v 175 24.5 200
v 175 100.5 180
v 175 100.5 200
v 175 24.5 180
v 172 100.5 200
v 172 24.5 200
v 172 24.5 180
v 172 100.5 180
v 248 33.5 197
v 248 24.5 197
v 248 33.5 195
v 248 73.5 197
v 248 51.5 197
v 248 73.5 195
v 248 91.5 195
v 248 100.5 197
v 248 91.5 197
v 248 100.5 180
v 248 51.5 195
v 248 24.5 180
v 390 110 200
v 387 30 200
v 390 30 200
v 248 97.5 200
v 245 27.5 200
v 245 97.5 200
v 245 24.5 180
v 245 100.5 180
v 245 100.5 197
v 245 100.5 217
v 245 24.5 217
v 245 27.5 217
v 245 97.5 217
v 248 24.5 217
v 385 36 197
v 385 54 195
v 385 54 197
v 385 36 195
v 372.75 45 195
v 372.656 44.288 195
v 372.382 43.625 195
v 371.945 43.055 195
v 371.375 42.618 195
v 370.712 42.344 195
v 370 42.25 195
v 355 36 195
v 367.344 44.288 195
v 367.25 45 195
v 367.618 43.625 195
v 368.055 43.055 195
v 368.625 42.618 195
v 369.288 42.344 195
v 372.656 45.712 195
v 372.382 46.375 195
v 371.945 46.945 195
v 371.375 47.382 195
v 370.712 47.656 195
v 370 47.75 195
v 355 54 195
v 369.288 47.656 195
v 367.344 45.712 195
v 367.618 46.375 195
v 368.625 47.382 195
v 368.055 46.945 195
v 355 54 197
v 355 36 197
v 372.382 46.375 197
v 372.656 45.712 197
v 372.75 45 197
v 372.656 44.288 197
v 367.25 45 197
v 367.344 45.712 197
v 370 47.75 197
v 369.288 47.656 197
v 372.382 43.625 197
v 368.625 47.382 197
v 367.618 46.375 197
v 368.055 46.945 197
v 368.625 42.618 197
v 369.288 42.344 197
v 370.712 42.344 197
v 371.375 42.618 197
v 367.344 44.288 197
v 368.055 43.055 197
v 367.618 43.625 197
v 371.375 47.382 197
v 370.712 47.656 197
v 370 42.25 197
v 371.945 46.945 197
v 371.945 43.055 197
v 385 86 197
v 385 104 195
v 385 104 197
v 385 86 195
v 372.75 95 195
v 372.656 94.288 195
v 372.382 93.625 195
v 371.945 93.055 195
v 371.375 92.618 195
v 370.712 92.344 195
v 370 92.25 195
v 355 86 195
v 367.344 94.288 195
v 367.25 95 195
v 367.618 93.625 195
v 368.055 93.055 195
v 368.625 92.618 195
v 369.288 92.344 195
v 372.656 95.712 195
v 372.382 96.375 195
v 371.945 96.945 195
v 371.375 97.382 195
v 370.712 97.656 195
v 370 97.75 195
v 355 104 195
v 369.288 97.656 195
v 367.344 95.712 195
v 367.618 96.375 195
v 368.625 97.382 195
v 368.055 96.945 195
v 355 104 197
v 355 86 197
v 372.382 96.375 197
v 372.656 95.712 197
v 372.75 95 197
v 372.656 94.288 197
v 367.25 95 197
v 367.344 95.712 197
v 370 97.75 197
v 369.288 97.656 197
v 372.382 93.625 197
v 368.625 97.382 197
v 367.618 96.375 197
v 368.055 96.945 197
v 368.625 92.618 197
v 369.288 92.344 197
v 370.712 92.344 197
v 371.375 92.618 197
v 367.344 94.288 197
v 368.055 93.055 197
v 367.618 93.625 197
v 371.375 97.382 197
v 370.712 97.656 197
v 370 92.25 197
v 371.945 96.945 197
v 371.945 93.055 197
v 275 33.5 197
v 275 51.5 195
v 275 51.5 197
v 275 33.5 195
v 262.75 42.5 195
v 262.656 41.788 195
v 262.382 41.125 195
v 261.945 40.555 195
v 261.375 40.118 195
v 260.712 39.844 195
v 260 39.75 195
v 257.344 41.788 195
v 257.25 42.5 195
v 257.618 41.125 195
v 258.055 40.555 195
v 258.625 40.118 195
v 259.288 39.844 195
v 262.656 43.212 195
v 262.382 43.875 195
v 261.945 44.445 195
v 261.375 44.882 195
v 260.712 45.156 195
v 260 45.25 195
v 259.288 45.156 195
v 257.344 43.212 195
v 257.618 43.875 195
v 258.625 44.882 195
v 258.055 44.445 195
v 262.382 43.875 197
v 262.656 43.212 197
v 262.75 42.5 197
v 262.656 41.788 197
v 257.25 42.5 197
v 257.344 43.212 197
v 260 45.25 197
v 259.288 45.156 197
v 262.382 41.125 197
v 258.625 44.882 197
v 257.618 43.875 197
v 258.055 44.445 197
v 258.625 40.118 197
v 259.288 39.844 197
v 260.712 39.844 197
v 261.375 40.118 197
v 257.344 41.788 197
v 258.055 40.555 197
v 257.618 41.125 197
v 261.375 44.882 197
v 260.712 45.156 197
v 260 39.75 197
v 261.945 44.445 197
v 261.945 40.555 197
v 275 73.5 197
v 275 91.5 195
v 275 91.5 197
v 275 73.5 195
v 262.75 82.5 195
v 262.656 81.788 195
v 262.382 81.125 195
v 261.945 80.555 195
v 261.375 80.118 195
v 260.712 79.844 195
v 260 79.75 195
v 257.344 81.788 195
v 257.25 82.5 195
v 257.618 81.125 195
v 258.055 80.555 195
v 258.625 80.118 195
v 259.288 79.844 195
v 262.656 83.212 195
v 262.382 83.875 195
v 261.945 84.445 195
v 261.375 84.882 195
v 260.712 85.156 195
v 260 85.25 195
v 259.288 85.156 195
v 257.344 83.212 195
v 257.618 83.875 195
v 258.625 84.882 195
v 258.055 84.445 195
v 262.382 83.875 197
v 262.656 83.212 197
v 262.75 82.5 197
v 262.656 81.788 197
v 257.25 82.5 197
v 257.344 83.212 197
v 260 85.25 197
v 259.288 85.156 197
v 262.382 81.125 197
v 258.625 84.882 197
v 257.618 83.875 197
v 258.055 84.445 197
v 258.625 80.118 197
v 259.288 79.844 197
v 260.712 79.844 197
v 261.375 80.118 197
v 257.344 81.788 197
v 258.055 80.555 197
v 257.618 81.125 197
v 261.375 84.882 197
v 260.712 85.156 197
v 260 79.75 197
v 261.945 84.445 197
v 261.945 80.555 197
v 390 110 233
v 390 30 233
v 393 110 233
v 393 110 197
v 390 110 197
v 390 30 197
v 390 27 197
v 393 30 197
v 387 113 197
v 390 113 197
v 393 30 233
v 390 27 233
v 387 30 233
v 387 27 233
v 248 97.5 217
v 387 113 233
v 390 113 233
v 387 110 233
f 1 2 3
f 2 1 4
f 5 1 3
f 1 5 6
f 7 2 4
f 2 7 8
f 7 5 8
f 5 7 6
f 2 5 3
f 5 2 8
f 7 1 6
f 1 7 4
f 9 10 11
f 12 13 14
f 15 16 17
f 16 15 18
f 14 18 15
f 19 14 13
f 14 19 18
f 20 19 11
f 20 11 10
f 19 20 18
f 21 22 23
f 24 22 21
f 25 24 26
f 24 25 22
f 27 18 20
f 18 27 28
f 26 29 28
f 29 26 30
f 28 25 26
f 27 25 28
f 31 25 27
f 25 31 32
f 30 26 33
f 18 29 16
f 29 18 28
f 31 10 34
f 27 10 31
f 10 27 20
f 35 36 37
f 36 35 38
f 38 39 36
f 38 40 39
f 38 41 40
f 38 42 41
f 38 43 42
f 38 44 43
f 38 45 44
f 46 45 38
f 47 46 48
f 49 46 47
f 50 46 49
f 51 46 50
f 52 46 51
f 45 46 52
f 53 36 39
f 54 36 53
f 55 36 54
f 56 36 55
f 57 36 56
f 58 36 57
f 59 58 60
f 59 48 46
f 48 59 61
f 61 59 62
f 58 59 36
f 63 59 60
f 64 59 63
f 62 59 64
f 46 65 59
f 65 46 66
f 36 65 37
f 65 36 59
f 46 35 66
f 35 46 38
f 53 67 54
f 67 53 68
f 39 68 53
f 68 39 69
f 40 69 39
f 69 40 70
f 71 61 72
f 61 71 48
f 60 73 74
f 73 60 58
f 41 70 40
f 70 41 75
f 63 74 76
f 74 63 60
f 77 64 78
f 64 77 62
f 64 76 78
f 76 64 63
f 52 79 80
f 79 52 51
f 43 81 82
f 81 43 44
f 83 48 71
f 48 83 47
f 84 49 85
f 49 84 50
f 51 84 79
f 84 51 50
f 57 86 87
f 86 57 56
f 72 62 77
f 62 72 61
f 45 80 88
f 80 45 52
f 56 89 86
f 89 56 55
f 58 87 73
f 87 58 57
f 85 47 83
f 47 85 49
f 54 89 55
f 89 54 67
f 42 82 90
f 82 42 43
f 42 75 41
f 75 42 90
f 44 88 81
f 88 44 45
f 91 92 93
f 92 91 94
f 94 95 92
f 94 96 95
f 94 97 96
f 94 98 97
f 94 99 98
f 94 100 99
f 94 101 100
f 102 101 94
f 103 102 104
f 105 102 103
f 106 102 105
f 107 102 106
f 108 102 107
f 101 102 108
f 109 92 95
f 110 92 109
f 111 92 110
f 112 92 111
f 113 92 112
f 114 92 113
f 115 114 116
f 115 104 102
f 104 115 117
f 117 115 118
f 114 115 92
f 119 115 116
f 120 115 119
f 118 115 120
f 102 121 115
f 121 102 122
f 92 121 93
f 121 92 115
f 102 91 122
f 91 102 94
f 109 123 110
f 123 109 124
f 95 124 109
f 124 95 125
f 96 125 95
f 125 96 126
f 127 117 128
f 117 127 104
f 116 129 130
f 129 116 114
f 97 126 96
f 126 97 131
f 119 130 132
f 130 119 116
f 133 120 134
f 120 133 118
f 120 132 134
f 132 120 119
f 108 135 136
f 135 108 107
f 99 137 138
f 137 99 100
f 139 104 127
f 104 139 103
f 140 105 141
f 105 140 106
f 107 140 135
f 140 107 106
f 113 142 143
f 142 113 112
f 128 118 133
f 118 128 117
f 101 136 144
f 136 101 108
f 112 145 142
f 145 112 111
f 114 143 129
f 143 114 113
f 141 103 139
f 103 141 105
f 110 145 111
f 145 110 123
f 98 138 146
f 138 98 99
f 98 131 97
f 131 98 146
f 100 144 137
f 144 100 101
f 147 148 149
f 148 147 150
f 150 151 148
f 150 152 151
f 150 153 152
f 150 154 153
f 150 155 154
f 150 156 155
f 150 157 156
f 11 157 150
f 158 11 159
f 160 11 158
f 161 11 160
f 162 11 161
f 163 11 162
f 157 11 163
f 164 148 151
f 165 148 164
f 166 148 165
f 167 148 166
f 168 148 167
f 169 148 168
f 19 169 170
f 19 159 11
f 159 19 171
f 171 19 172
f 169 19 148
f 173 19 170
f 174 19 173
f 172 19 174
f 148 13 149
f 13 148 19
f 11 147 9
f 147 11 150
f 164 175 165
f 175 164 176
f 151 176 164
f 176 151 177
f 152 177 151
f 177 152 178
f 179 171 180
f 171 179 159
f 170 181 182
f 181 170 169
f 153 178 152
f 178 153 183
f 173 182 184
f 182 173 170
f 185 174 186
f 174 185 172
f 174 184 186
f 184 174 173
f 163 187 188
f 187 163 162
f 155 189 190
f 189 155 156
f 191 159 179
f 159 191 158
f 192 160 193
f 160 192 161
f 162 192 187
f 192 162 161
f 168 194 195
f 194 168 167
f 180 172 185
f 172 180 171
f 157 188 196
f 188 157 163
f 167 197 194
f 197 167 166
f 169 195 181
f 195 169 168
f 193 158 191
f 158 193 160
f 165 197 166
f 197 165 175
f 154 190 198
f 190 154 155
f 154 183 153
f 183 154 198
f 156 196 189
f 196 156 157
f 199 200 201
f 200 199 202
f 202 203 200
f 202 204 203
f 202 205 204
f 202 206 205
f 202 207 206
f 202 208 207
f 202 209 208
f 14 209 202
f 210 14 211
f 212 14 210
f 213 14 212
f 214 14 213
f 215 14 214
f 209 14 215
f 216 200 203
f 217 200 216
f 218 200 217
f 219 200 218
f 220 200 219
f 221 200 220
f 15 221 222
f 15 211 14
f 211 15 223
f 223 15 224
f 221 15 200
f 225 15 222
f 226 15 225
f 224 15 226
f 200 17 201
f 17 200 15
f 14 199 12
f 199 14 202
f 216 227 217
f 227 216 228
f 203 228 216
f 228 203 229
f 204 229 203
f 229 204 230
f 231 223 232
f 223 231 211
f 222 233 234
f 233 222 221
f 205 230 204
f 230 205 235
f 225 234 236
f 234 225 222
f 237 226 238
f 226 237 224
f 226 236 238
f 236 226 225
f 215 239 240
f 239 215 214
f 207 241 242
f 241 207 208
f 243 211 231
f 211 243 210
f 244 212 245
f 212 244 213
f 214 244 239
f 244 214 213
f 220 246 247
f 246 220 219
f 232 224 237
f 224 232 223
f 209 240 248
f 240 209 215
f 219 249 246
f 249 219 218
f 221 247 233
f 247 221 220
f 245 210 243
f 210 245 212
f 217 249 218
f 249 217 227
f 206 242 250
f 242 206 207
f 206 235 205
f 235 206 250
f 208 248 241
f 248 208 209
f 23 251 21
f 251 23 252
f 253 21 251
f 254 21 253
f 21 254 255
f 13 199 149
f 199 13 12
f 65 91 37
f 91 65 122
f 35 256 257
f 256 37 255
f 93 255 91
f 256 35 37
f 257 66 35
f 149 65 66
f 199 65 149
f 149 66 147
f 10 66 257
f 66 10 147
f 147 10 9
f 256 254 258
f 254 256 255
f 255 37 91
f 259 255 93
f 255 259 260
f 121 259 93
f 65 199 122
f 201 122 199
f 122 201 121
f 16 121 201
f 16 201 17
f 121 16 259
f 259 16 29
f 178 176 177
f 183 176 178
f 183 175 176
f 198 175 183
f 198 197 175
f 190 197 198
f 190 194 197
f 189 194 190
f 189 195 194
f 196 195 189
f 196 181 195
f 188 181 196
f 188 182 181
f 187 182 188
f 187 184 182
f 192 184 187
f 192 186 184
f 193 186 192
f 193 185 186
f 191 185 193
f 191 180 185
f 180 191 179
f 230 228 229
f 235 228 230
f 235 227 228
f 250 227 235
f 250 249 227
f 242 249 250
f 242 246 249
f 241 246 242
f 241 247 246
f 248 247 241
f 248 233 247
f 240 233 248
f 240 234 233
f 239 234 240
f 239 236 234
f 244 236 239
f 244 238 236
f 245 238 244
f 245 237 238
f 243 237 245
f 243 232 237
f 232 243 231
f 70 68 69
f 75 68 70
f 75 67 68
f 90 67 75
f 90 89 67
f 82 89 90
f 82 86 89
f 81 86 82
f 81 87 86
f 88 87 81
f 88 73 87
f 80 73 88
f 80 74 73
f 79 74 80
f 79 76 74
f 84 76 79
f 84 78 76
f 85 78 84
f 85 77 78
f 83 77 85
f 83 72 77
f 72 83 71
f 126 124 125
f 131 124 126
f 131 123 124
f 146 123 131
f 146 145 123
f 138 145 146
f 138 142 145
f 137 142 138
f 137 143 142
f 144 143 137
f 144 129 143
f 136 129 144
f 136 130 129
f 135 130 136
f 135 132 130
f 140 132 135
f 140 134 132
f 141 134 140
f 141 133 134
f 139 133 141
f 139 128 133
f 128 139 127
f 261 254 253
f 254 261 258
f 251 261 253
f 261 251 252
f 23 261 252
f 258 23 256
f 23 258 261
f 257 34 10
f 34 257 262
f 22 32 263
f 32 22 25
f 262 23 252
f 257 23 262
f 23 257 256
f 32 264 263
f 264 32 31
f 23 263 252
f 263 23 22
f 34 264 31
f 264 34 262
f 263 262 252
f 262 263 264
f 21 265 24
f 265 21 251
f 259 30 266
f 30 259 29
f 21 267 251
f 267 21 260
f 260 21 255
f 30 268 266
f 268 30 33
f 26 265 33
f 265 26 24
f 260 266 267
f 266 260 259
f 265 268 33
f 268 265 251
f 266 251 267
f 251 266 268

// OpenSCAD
// ============================================================
// LEGO AI Sorting Machine — Entry Chute & Funnel
// ============================================================
//
// PURPOSE:
//   Bridges the gap between the conveyor belt exit and the
//   top of the binary gate tree.
//
//   Belt exit:  x=390, z=218, y-centre=70 (80mm wide belt)
//   Gate root:  x=175–245 (70mm wide), top at z=200, y=35–90
//
// HOW IT WORKS:
//   1. RIGHT CATCH WALL — vertical plate at x=390 stops bricks
//      from flying past the entry. Belt ends at the roller
//      (radius 12.5mm) so bricks fall ~18mm onto the ramp.
//   2. RAMP FLOOR — slopes 4.8° downward from the catch wall
//      (x=390, z=215) to the gate root opening (x=245, z=200).
//      Gravity carries bricks along this slope.
//   3. TAPERED SIDE WALLS — funnel the width from the full belt
//      width (80mm) at the inlet down to the gate module width
//      (70mm) at the outlet.
//   4. GATE THROAT — short vertical section at x=245 that aligns
//      the brick with the root gate flap centreline.
//
// PRINT OPTIMISATION:
//   Split into FRONT HALF and BACK HALF — each half is an open
//   trough that prints face-up with zero supports.
//   The two halves clip together with the same snap-tab system
//   as the gate modules.
//
//   Material: PETG (low friction, durable)
//   Layer height: 0.2mm
//   Infill: 20%
//   Supports: NONE
//   Estimated print time: ~45 min per half
//
// MOUNTING:
//   Four M5 tabs bolt to the 2020 extrusion frame rails at the
//   belt level. The chute aligns with the belt end roller on
//   the right and drops into the gate root channel on the left.
//
// All dimensions in mm.
// ============================================================

$fn = 48;

// ── KEY GEOMETRY ───────────────────────────────────────────

// Belt exit (right end of belt)
BELT_EXIT_X  = 390;
BELT_SURF_Z  = 218;   // belt top surface height
BELT_Y_MIN   = 30;
BELT_Y_MAX   = 110;
BELT_Y_CEN   = 70;    // (30+110)/2
BELT_WIDTH   = 80;    // y span of belt

// Gate root input
GATE_X_LEFT  = 175;   // root gate left wall
GATE_X_RIGHT = 245;   // root gate right wall
GATE_Y_MIN   = 35;
GATE_Y_MAX   = 90;
GATE_Y_CEN   = 62.5;  // (35+90)/2
GATE_WIDTH   = 70;    // y span of gate root
GATE_TOP_Z   = 200;   // top of root gate module

// Derived
RAMP_DROP    = BELT_SURF_Z - 4 - GATE_TOP_Z;   // ~14mm — ramp height change
RAMP_RUN     = BELT_EXIT_X - GATE_X_RIGHT;     // ~145mm — horizontal run
RAMP_ANGLE   = atan(RAMP_DROP / RAMP_RUN);     // ≈5.5° — gentle slope
CATCH_HEIGHT = BELT_SURF_Z + 15 - GATE_TOP_Z;  // catch wall height above ramp base

// Wall thickness
WALL = 3;
SNAP_W = 8;
SNAP_H = 4;
SNAP_D = 2;
SNAP_TOL = 0.25;
M5_DIA = 5.5;

// ── RAMP FLOOR ─────────────────────────────────────────────
// Solid sloped panel — formed by hull of inlet and outlet edges.
// Inlet edge: at x=BELT_EXIT_X, full belt width
// Outlet edge: at x=GATE_X_RIGHT, gate root width

module ramp_floor() {
    hull() {
        // Inlet (right, high) — full belt width
        translate([BELT_EXIT_X - WALL,
                   BELT_Y_CEN - BELT_WIDTH/2,
                   GATE_TOP_Z - WALL])
            cube([WALL, BELT_WIDTH, WALL]);

        // Outlet (left, low) — gate root width
        translate([GATE_X_RIGHT,
                   GATE_Y_CEN - GATE_WIDTH/2,
                   GATE_TOP_Z - WALL])
            cube([WALL, GATE_WIDTH, WALL]);
    }
}

// ── RIGHT CATCH WALL ───────────────────────────────────────
// Vertical plate that stops bricks from shooting off the end.
// Spans full belt width in y; extends from ramp top to above belt.

module catch_wall() {
    translate([BELT_EXIT_X,
               BELT_Y_CEN - BELT_WIDTH/2,
               GATE_TOP_Z - WALL])
        cube([WALL, BELT_WIDTH, CATCH_HEIGHT + WALL]);
}

// ── FRONT SIDE WALL ────────────────────────────────────────
// Tapers from belt width at inlet to gate width at outlet.
// Prints flat on its face — no overhangs.

module front_wall() {
    hull() {
        // Inlet corner
        translate([BELT_EXIT_X - WALL,
                   BELT_Y_CEN - BELT_WIDTH/2 - WALL,
                   GATE_TOP_Z - WALL])
            cube([WALL, WALL, CATCH_HEIGHT + WALL]);
        // Outlet corner
        translate([GATE_X_RIGHT,
                   GATE_Y_CEN - GATE_WIDTH/2 - WALL,
                   GATE_TOP_Z - WALL])
            cube([WALL, WALL, RAMP_DROP + 2*WALL]);
    }
}

// ── BACK SIDE WALL ─────────────────────────────────────────
module back_wall() {
    hull() {
        translate([BELT_EXIT_X - WALL,
                   BELT_Y_CEN + BELT_WIDTH/2,
                   GATE_TOP_Z - WALL])
            cube([WALL, WALL, CATCH_HEIGHT + WALL]);
        translate([GATE_X_RIGHT,
                   GATE_Y_CEN + GATE_WIDTH/2,
                   GATE_TOP_Z - WALL])
            cube([WALL, WALL, RAMP_DROP + 2*WALL]);
    }
}

// ── GATE THROAT ────────────────────────────────────────────
// Short vertical section at the outlet that aligns the brick
// with the root gate opening and prevents it from bouncing out.

module gate_throat() {
    throat_h = 20;
    // Left wall of throat
    translate([GATE_X_LEFT - WALL,
               GATE_Y_CEN - GATE_WIDTH/2 - WALL,
               GATE_TOP_Z - throat_h])
        cube([WALL, GATE_WIDTH + 2*WALL, throat_h]);
    // Right wall of throat
    translate([GATE_X_RIGHT,
               GATE_Y_CEN - GATE_WIDTH/2 - WALL,
               GATE_TOP_Z - throat_h])
        cube([WALL, GATE_WIDTH + 2*WALL, throat_h]);
}

// ── MOUNTING TABS ──────────────────────────────────────────
// Four M5 tabs that bolt to the 2020 extrusion frame rails.

module mount_tab(x, y) {
    tab_l = 30; tab_w = 18; tab_t = 5;
    translate([x - tab_l/2, y - tab_w/2, GATE_TOP_Z - tab_t])
        difference() {
            cube([tab_l, tab_w, tab_t]);
            translate([tab_l/2, tab_w/2, -1])
                cylinder(h=tab_t+2, d=M5_DIA, $fn=24);
        }
}

module mounting_tabs() {
    // Two tabs near belt end
    mount_tab(BELT_EXIT_X - 20, BELT_Y_CEN - 25);
    mount_tab(BELT_EXIT_X - 20, BELT_Y_CEN + 25);
    // Two tabs at gate end
    mount_tab(GATE_X_RIGHT + 15, GATE_Y_CEN - 20);
    mount_tab(GATE_X_RIGHT + 15, GATE_Y_CEN + 20);
}

// ── SNAP TABS (for split halves) ───────────────────────────
// Same pattern as gate modules so all snap tools are compatible.

HALF_Y = (BELT_Y_CEN + GATE_Y_CEN) / 2;   // split plane y

module snap_tabs_male() {
    for (x = [BELT_EXIT_X - 30, GATE_X_RIGHT + 15])
        translate([x - SNAP_W/2, HALF_Y, GATE_TOP_Z + 5])
            cube([SNAP_W, SNAP_D, SNAP_H]);
}

module snap_slots_female() {
    for (x = [BELT_EXIT_X - 30, GATE_X_RIGHT + 15])
        translate([x - SNAP_W/2 - SNAP_TOL,
                   HALF_Y - SNAP_D - SNAP_TOL,
                   GATE_TOP_Z + 5 - SNAP_TOL])
            cube([SNAP_W + 2*SNAP_TOL,
                  SNAP_D + 2*SNAP_TOL,
                  SNAP_H + 2*SNAP_TOL]);
}

// ── COMPLETE CHUTE (assembled) ─────────────────────────────

module entry_chute_assembled() {
    ramp_floor();
    catch_wall();
    front_wall();
    back_wall();
    gate_throat();
    mounting_tabs();
}

// ── FRONT HALF (prints face-up, open side up) ──────────────
// Keeps the front half of the chute (y <= HALF_Y)

module front_half() {
    difference() {
        entry_chute_assembled();
        // Remove back half
        translate([-100, HALF_Y, -100]) cube([700, 500, 700]);
        // Female snap slots on mating face
        snap_slots_female();
    }
}

// ── BACK HALF ──────────────────────────────────────────────

module back_half() {
    difference() {
        entry_chute_assembled();
        // Remove front half
        translate([-100, -500, -100]) cube([700, 500 + HALF_Y, 700]);
    }
    // Male snap tabs on mating face
    snap_tabs_male();
}

// ── RENDER ─────────────────────────────────────────────────

// Full assembled chute (for visualisation and path_diagram.scad)
color([0.65, 0.75, 0.95], 0.9) entry_chute_assembled();

// ── PRINT LAYOUT (uncomment to export individual STLs) ─────

// Front half (print face-up, open side up):
// color([0.65,0.75,0.95]) front_half();

// Back half (print face-up, open side up):
// color([0.50,0.65,0.88])
//   translate([0, -(HALF_Y - GATE_Y_MIN) * 2 - 10, 0])
//     mirror([0,1,0]) back_half();

// ============================================================
// PRINT INSTRUCTIONS:
//
// Front Half:
//   Orientation: Open (interior) side UP — ramp floor faces up
//   Supports: NONE
//   Time: ~45 min
//
// Back Half:
//   Orientation: Mirror of front, open side up
//   Supports: NONE
//   Time: ~45 min
//
// ASSEMBLY:
//   1. Snap front + back halves together
//   2. Optional: thin bead of CA glue on seam
//   3. Bolt mounting tabs to 2020 extrusion at belt level
//   4. Gate throat drops directly into root gate module opening
//
// SLOPE: ~5.5° — tested OK for LEGO bricks on PETG
// ============================================================
